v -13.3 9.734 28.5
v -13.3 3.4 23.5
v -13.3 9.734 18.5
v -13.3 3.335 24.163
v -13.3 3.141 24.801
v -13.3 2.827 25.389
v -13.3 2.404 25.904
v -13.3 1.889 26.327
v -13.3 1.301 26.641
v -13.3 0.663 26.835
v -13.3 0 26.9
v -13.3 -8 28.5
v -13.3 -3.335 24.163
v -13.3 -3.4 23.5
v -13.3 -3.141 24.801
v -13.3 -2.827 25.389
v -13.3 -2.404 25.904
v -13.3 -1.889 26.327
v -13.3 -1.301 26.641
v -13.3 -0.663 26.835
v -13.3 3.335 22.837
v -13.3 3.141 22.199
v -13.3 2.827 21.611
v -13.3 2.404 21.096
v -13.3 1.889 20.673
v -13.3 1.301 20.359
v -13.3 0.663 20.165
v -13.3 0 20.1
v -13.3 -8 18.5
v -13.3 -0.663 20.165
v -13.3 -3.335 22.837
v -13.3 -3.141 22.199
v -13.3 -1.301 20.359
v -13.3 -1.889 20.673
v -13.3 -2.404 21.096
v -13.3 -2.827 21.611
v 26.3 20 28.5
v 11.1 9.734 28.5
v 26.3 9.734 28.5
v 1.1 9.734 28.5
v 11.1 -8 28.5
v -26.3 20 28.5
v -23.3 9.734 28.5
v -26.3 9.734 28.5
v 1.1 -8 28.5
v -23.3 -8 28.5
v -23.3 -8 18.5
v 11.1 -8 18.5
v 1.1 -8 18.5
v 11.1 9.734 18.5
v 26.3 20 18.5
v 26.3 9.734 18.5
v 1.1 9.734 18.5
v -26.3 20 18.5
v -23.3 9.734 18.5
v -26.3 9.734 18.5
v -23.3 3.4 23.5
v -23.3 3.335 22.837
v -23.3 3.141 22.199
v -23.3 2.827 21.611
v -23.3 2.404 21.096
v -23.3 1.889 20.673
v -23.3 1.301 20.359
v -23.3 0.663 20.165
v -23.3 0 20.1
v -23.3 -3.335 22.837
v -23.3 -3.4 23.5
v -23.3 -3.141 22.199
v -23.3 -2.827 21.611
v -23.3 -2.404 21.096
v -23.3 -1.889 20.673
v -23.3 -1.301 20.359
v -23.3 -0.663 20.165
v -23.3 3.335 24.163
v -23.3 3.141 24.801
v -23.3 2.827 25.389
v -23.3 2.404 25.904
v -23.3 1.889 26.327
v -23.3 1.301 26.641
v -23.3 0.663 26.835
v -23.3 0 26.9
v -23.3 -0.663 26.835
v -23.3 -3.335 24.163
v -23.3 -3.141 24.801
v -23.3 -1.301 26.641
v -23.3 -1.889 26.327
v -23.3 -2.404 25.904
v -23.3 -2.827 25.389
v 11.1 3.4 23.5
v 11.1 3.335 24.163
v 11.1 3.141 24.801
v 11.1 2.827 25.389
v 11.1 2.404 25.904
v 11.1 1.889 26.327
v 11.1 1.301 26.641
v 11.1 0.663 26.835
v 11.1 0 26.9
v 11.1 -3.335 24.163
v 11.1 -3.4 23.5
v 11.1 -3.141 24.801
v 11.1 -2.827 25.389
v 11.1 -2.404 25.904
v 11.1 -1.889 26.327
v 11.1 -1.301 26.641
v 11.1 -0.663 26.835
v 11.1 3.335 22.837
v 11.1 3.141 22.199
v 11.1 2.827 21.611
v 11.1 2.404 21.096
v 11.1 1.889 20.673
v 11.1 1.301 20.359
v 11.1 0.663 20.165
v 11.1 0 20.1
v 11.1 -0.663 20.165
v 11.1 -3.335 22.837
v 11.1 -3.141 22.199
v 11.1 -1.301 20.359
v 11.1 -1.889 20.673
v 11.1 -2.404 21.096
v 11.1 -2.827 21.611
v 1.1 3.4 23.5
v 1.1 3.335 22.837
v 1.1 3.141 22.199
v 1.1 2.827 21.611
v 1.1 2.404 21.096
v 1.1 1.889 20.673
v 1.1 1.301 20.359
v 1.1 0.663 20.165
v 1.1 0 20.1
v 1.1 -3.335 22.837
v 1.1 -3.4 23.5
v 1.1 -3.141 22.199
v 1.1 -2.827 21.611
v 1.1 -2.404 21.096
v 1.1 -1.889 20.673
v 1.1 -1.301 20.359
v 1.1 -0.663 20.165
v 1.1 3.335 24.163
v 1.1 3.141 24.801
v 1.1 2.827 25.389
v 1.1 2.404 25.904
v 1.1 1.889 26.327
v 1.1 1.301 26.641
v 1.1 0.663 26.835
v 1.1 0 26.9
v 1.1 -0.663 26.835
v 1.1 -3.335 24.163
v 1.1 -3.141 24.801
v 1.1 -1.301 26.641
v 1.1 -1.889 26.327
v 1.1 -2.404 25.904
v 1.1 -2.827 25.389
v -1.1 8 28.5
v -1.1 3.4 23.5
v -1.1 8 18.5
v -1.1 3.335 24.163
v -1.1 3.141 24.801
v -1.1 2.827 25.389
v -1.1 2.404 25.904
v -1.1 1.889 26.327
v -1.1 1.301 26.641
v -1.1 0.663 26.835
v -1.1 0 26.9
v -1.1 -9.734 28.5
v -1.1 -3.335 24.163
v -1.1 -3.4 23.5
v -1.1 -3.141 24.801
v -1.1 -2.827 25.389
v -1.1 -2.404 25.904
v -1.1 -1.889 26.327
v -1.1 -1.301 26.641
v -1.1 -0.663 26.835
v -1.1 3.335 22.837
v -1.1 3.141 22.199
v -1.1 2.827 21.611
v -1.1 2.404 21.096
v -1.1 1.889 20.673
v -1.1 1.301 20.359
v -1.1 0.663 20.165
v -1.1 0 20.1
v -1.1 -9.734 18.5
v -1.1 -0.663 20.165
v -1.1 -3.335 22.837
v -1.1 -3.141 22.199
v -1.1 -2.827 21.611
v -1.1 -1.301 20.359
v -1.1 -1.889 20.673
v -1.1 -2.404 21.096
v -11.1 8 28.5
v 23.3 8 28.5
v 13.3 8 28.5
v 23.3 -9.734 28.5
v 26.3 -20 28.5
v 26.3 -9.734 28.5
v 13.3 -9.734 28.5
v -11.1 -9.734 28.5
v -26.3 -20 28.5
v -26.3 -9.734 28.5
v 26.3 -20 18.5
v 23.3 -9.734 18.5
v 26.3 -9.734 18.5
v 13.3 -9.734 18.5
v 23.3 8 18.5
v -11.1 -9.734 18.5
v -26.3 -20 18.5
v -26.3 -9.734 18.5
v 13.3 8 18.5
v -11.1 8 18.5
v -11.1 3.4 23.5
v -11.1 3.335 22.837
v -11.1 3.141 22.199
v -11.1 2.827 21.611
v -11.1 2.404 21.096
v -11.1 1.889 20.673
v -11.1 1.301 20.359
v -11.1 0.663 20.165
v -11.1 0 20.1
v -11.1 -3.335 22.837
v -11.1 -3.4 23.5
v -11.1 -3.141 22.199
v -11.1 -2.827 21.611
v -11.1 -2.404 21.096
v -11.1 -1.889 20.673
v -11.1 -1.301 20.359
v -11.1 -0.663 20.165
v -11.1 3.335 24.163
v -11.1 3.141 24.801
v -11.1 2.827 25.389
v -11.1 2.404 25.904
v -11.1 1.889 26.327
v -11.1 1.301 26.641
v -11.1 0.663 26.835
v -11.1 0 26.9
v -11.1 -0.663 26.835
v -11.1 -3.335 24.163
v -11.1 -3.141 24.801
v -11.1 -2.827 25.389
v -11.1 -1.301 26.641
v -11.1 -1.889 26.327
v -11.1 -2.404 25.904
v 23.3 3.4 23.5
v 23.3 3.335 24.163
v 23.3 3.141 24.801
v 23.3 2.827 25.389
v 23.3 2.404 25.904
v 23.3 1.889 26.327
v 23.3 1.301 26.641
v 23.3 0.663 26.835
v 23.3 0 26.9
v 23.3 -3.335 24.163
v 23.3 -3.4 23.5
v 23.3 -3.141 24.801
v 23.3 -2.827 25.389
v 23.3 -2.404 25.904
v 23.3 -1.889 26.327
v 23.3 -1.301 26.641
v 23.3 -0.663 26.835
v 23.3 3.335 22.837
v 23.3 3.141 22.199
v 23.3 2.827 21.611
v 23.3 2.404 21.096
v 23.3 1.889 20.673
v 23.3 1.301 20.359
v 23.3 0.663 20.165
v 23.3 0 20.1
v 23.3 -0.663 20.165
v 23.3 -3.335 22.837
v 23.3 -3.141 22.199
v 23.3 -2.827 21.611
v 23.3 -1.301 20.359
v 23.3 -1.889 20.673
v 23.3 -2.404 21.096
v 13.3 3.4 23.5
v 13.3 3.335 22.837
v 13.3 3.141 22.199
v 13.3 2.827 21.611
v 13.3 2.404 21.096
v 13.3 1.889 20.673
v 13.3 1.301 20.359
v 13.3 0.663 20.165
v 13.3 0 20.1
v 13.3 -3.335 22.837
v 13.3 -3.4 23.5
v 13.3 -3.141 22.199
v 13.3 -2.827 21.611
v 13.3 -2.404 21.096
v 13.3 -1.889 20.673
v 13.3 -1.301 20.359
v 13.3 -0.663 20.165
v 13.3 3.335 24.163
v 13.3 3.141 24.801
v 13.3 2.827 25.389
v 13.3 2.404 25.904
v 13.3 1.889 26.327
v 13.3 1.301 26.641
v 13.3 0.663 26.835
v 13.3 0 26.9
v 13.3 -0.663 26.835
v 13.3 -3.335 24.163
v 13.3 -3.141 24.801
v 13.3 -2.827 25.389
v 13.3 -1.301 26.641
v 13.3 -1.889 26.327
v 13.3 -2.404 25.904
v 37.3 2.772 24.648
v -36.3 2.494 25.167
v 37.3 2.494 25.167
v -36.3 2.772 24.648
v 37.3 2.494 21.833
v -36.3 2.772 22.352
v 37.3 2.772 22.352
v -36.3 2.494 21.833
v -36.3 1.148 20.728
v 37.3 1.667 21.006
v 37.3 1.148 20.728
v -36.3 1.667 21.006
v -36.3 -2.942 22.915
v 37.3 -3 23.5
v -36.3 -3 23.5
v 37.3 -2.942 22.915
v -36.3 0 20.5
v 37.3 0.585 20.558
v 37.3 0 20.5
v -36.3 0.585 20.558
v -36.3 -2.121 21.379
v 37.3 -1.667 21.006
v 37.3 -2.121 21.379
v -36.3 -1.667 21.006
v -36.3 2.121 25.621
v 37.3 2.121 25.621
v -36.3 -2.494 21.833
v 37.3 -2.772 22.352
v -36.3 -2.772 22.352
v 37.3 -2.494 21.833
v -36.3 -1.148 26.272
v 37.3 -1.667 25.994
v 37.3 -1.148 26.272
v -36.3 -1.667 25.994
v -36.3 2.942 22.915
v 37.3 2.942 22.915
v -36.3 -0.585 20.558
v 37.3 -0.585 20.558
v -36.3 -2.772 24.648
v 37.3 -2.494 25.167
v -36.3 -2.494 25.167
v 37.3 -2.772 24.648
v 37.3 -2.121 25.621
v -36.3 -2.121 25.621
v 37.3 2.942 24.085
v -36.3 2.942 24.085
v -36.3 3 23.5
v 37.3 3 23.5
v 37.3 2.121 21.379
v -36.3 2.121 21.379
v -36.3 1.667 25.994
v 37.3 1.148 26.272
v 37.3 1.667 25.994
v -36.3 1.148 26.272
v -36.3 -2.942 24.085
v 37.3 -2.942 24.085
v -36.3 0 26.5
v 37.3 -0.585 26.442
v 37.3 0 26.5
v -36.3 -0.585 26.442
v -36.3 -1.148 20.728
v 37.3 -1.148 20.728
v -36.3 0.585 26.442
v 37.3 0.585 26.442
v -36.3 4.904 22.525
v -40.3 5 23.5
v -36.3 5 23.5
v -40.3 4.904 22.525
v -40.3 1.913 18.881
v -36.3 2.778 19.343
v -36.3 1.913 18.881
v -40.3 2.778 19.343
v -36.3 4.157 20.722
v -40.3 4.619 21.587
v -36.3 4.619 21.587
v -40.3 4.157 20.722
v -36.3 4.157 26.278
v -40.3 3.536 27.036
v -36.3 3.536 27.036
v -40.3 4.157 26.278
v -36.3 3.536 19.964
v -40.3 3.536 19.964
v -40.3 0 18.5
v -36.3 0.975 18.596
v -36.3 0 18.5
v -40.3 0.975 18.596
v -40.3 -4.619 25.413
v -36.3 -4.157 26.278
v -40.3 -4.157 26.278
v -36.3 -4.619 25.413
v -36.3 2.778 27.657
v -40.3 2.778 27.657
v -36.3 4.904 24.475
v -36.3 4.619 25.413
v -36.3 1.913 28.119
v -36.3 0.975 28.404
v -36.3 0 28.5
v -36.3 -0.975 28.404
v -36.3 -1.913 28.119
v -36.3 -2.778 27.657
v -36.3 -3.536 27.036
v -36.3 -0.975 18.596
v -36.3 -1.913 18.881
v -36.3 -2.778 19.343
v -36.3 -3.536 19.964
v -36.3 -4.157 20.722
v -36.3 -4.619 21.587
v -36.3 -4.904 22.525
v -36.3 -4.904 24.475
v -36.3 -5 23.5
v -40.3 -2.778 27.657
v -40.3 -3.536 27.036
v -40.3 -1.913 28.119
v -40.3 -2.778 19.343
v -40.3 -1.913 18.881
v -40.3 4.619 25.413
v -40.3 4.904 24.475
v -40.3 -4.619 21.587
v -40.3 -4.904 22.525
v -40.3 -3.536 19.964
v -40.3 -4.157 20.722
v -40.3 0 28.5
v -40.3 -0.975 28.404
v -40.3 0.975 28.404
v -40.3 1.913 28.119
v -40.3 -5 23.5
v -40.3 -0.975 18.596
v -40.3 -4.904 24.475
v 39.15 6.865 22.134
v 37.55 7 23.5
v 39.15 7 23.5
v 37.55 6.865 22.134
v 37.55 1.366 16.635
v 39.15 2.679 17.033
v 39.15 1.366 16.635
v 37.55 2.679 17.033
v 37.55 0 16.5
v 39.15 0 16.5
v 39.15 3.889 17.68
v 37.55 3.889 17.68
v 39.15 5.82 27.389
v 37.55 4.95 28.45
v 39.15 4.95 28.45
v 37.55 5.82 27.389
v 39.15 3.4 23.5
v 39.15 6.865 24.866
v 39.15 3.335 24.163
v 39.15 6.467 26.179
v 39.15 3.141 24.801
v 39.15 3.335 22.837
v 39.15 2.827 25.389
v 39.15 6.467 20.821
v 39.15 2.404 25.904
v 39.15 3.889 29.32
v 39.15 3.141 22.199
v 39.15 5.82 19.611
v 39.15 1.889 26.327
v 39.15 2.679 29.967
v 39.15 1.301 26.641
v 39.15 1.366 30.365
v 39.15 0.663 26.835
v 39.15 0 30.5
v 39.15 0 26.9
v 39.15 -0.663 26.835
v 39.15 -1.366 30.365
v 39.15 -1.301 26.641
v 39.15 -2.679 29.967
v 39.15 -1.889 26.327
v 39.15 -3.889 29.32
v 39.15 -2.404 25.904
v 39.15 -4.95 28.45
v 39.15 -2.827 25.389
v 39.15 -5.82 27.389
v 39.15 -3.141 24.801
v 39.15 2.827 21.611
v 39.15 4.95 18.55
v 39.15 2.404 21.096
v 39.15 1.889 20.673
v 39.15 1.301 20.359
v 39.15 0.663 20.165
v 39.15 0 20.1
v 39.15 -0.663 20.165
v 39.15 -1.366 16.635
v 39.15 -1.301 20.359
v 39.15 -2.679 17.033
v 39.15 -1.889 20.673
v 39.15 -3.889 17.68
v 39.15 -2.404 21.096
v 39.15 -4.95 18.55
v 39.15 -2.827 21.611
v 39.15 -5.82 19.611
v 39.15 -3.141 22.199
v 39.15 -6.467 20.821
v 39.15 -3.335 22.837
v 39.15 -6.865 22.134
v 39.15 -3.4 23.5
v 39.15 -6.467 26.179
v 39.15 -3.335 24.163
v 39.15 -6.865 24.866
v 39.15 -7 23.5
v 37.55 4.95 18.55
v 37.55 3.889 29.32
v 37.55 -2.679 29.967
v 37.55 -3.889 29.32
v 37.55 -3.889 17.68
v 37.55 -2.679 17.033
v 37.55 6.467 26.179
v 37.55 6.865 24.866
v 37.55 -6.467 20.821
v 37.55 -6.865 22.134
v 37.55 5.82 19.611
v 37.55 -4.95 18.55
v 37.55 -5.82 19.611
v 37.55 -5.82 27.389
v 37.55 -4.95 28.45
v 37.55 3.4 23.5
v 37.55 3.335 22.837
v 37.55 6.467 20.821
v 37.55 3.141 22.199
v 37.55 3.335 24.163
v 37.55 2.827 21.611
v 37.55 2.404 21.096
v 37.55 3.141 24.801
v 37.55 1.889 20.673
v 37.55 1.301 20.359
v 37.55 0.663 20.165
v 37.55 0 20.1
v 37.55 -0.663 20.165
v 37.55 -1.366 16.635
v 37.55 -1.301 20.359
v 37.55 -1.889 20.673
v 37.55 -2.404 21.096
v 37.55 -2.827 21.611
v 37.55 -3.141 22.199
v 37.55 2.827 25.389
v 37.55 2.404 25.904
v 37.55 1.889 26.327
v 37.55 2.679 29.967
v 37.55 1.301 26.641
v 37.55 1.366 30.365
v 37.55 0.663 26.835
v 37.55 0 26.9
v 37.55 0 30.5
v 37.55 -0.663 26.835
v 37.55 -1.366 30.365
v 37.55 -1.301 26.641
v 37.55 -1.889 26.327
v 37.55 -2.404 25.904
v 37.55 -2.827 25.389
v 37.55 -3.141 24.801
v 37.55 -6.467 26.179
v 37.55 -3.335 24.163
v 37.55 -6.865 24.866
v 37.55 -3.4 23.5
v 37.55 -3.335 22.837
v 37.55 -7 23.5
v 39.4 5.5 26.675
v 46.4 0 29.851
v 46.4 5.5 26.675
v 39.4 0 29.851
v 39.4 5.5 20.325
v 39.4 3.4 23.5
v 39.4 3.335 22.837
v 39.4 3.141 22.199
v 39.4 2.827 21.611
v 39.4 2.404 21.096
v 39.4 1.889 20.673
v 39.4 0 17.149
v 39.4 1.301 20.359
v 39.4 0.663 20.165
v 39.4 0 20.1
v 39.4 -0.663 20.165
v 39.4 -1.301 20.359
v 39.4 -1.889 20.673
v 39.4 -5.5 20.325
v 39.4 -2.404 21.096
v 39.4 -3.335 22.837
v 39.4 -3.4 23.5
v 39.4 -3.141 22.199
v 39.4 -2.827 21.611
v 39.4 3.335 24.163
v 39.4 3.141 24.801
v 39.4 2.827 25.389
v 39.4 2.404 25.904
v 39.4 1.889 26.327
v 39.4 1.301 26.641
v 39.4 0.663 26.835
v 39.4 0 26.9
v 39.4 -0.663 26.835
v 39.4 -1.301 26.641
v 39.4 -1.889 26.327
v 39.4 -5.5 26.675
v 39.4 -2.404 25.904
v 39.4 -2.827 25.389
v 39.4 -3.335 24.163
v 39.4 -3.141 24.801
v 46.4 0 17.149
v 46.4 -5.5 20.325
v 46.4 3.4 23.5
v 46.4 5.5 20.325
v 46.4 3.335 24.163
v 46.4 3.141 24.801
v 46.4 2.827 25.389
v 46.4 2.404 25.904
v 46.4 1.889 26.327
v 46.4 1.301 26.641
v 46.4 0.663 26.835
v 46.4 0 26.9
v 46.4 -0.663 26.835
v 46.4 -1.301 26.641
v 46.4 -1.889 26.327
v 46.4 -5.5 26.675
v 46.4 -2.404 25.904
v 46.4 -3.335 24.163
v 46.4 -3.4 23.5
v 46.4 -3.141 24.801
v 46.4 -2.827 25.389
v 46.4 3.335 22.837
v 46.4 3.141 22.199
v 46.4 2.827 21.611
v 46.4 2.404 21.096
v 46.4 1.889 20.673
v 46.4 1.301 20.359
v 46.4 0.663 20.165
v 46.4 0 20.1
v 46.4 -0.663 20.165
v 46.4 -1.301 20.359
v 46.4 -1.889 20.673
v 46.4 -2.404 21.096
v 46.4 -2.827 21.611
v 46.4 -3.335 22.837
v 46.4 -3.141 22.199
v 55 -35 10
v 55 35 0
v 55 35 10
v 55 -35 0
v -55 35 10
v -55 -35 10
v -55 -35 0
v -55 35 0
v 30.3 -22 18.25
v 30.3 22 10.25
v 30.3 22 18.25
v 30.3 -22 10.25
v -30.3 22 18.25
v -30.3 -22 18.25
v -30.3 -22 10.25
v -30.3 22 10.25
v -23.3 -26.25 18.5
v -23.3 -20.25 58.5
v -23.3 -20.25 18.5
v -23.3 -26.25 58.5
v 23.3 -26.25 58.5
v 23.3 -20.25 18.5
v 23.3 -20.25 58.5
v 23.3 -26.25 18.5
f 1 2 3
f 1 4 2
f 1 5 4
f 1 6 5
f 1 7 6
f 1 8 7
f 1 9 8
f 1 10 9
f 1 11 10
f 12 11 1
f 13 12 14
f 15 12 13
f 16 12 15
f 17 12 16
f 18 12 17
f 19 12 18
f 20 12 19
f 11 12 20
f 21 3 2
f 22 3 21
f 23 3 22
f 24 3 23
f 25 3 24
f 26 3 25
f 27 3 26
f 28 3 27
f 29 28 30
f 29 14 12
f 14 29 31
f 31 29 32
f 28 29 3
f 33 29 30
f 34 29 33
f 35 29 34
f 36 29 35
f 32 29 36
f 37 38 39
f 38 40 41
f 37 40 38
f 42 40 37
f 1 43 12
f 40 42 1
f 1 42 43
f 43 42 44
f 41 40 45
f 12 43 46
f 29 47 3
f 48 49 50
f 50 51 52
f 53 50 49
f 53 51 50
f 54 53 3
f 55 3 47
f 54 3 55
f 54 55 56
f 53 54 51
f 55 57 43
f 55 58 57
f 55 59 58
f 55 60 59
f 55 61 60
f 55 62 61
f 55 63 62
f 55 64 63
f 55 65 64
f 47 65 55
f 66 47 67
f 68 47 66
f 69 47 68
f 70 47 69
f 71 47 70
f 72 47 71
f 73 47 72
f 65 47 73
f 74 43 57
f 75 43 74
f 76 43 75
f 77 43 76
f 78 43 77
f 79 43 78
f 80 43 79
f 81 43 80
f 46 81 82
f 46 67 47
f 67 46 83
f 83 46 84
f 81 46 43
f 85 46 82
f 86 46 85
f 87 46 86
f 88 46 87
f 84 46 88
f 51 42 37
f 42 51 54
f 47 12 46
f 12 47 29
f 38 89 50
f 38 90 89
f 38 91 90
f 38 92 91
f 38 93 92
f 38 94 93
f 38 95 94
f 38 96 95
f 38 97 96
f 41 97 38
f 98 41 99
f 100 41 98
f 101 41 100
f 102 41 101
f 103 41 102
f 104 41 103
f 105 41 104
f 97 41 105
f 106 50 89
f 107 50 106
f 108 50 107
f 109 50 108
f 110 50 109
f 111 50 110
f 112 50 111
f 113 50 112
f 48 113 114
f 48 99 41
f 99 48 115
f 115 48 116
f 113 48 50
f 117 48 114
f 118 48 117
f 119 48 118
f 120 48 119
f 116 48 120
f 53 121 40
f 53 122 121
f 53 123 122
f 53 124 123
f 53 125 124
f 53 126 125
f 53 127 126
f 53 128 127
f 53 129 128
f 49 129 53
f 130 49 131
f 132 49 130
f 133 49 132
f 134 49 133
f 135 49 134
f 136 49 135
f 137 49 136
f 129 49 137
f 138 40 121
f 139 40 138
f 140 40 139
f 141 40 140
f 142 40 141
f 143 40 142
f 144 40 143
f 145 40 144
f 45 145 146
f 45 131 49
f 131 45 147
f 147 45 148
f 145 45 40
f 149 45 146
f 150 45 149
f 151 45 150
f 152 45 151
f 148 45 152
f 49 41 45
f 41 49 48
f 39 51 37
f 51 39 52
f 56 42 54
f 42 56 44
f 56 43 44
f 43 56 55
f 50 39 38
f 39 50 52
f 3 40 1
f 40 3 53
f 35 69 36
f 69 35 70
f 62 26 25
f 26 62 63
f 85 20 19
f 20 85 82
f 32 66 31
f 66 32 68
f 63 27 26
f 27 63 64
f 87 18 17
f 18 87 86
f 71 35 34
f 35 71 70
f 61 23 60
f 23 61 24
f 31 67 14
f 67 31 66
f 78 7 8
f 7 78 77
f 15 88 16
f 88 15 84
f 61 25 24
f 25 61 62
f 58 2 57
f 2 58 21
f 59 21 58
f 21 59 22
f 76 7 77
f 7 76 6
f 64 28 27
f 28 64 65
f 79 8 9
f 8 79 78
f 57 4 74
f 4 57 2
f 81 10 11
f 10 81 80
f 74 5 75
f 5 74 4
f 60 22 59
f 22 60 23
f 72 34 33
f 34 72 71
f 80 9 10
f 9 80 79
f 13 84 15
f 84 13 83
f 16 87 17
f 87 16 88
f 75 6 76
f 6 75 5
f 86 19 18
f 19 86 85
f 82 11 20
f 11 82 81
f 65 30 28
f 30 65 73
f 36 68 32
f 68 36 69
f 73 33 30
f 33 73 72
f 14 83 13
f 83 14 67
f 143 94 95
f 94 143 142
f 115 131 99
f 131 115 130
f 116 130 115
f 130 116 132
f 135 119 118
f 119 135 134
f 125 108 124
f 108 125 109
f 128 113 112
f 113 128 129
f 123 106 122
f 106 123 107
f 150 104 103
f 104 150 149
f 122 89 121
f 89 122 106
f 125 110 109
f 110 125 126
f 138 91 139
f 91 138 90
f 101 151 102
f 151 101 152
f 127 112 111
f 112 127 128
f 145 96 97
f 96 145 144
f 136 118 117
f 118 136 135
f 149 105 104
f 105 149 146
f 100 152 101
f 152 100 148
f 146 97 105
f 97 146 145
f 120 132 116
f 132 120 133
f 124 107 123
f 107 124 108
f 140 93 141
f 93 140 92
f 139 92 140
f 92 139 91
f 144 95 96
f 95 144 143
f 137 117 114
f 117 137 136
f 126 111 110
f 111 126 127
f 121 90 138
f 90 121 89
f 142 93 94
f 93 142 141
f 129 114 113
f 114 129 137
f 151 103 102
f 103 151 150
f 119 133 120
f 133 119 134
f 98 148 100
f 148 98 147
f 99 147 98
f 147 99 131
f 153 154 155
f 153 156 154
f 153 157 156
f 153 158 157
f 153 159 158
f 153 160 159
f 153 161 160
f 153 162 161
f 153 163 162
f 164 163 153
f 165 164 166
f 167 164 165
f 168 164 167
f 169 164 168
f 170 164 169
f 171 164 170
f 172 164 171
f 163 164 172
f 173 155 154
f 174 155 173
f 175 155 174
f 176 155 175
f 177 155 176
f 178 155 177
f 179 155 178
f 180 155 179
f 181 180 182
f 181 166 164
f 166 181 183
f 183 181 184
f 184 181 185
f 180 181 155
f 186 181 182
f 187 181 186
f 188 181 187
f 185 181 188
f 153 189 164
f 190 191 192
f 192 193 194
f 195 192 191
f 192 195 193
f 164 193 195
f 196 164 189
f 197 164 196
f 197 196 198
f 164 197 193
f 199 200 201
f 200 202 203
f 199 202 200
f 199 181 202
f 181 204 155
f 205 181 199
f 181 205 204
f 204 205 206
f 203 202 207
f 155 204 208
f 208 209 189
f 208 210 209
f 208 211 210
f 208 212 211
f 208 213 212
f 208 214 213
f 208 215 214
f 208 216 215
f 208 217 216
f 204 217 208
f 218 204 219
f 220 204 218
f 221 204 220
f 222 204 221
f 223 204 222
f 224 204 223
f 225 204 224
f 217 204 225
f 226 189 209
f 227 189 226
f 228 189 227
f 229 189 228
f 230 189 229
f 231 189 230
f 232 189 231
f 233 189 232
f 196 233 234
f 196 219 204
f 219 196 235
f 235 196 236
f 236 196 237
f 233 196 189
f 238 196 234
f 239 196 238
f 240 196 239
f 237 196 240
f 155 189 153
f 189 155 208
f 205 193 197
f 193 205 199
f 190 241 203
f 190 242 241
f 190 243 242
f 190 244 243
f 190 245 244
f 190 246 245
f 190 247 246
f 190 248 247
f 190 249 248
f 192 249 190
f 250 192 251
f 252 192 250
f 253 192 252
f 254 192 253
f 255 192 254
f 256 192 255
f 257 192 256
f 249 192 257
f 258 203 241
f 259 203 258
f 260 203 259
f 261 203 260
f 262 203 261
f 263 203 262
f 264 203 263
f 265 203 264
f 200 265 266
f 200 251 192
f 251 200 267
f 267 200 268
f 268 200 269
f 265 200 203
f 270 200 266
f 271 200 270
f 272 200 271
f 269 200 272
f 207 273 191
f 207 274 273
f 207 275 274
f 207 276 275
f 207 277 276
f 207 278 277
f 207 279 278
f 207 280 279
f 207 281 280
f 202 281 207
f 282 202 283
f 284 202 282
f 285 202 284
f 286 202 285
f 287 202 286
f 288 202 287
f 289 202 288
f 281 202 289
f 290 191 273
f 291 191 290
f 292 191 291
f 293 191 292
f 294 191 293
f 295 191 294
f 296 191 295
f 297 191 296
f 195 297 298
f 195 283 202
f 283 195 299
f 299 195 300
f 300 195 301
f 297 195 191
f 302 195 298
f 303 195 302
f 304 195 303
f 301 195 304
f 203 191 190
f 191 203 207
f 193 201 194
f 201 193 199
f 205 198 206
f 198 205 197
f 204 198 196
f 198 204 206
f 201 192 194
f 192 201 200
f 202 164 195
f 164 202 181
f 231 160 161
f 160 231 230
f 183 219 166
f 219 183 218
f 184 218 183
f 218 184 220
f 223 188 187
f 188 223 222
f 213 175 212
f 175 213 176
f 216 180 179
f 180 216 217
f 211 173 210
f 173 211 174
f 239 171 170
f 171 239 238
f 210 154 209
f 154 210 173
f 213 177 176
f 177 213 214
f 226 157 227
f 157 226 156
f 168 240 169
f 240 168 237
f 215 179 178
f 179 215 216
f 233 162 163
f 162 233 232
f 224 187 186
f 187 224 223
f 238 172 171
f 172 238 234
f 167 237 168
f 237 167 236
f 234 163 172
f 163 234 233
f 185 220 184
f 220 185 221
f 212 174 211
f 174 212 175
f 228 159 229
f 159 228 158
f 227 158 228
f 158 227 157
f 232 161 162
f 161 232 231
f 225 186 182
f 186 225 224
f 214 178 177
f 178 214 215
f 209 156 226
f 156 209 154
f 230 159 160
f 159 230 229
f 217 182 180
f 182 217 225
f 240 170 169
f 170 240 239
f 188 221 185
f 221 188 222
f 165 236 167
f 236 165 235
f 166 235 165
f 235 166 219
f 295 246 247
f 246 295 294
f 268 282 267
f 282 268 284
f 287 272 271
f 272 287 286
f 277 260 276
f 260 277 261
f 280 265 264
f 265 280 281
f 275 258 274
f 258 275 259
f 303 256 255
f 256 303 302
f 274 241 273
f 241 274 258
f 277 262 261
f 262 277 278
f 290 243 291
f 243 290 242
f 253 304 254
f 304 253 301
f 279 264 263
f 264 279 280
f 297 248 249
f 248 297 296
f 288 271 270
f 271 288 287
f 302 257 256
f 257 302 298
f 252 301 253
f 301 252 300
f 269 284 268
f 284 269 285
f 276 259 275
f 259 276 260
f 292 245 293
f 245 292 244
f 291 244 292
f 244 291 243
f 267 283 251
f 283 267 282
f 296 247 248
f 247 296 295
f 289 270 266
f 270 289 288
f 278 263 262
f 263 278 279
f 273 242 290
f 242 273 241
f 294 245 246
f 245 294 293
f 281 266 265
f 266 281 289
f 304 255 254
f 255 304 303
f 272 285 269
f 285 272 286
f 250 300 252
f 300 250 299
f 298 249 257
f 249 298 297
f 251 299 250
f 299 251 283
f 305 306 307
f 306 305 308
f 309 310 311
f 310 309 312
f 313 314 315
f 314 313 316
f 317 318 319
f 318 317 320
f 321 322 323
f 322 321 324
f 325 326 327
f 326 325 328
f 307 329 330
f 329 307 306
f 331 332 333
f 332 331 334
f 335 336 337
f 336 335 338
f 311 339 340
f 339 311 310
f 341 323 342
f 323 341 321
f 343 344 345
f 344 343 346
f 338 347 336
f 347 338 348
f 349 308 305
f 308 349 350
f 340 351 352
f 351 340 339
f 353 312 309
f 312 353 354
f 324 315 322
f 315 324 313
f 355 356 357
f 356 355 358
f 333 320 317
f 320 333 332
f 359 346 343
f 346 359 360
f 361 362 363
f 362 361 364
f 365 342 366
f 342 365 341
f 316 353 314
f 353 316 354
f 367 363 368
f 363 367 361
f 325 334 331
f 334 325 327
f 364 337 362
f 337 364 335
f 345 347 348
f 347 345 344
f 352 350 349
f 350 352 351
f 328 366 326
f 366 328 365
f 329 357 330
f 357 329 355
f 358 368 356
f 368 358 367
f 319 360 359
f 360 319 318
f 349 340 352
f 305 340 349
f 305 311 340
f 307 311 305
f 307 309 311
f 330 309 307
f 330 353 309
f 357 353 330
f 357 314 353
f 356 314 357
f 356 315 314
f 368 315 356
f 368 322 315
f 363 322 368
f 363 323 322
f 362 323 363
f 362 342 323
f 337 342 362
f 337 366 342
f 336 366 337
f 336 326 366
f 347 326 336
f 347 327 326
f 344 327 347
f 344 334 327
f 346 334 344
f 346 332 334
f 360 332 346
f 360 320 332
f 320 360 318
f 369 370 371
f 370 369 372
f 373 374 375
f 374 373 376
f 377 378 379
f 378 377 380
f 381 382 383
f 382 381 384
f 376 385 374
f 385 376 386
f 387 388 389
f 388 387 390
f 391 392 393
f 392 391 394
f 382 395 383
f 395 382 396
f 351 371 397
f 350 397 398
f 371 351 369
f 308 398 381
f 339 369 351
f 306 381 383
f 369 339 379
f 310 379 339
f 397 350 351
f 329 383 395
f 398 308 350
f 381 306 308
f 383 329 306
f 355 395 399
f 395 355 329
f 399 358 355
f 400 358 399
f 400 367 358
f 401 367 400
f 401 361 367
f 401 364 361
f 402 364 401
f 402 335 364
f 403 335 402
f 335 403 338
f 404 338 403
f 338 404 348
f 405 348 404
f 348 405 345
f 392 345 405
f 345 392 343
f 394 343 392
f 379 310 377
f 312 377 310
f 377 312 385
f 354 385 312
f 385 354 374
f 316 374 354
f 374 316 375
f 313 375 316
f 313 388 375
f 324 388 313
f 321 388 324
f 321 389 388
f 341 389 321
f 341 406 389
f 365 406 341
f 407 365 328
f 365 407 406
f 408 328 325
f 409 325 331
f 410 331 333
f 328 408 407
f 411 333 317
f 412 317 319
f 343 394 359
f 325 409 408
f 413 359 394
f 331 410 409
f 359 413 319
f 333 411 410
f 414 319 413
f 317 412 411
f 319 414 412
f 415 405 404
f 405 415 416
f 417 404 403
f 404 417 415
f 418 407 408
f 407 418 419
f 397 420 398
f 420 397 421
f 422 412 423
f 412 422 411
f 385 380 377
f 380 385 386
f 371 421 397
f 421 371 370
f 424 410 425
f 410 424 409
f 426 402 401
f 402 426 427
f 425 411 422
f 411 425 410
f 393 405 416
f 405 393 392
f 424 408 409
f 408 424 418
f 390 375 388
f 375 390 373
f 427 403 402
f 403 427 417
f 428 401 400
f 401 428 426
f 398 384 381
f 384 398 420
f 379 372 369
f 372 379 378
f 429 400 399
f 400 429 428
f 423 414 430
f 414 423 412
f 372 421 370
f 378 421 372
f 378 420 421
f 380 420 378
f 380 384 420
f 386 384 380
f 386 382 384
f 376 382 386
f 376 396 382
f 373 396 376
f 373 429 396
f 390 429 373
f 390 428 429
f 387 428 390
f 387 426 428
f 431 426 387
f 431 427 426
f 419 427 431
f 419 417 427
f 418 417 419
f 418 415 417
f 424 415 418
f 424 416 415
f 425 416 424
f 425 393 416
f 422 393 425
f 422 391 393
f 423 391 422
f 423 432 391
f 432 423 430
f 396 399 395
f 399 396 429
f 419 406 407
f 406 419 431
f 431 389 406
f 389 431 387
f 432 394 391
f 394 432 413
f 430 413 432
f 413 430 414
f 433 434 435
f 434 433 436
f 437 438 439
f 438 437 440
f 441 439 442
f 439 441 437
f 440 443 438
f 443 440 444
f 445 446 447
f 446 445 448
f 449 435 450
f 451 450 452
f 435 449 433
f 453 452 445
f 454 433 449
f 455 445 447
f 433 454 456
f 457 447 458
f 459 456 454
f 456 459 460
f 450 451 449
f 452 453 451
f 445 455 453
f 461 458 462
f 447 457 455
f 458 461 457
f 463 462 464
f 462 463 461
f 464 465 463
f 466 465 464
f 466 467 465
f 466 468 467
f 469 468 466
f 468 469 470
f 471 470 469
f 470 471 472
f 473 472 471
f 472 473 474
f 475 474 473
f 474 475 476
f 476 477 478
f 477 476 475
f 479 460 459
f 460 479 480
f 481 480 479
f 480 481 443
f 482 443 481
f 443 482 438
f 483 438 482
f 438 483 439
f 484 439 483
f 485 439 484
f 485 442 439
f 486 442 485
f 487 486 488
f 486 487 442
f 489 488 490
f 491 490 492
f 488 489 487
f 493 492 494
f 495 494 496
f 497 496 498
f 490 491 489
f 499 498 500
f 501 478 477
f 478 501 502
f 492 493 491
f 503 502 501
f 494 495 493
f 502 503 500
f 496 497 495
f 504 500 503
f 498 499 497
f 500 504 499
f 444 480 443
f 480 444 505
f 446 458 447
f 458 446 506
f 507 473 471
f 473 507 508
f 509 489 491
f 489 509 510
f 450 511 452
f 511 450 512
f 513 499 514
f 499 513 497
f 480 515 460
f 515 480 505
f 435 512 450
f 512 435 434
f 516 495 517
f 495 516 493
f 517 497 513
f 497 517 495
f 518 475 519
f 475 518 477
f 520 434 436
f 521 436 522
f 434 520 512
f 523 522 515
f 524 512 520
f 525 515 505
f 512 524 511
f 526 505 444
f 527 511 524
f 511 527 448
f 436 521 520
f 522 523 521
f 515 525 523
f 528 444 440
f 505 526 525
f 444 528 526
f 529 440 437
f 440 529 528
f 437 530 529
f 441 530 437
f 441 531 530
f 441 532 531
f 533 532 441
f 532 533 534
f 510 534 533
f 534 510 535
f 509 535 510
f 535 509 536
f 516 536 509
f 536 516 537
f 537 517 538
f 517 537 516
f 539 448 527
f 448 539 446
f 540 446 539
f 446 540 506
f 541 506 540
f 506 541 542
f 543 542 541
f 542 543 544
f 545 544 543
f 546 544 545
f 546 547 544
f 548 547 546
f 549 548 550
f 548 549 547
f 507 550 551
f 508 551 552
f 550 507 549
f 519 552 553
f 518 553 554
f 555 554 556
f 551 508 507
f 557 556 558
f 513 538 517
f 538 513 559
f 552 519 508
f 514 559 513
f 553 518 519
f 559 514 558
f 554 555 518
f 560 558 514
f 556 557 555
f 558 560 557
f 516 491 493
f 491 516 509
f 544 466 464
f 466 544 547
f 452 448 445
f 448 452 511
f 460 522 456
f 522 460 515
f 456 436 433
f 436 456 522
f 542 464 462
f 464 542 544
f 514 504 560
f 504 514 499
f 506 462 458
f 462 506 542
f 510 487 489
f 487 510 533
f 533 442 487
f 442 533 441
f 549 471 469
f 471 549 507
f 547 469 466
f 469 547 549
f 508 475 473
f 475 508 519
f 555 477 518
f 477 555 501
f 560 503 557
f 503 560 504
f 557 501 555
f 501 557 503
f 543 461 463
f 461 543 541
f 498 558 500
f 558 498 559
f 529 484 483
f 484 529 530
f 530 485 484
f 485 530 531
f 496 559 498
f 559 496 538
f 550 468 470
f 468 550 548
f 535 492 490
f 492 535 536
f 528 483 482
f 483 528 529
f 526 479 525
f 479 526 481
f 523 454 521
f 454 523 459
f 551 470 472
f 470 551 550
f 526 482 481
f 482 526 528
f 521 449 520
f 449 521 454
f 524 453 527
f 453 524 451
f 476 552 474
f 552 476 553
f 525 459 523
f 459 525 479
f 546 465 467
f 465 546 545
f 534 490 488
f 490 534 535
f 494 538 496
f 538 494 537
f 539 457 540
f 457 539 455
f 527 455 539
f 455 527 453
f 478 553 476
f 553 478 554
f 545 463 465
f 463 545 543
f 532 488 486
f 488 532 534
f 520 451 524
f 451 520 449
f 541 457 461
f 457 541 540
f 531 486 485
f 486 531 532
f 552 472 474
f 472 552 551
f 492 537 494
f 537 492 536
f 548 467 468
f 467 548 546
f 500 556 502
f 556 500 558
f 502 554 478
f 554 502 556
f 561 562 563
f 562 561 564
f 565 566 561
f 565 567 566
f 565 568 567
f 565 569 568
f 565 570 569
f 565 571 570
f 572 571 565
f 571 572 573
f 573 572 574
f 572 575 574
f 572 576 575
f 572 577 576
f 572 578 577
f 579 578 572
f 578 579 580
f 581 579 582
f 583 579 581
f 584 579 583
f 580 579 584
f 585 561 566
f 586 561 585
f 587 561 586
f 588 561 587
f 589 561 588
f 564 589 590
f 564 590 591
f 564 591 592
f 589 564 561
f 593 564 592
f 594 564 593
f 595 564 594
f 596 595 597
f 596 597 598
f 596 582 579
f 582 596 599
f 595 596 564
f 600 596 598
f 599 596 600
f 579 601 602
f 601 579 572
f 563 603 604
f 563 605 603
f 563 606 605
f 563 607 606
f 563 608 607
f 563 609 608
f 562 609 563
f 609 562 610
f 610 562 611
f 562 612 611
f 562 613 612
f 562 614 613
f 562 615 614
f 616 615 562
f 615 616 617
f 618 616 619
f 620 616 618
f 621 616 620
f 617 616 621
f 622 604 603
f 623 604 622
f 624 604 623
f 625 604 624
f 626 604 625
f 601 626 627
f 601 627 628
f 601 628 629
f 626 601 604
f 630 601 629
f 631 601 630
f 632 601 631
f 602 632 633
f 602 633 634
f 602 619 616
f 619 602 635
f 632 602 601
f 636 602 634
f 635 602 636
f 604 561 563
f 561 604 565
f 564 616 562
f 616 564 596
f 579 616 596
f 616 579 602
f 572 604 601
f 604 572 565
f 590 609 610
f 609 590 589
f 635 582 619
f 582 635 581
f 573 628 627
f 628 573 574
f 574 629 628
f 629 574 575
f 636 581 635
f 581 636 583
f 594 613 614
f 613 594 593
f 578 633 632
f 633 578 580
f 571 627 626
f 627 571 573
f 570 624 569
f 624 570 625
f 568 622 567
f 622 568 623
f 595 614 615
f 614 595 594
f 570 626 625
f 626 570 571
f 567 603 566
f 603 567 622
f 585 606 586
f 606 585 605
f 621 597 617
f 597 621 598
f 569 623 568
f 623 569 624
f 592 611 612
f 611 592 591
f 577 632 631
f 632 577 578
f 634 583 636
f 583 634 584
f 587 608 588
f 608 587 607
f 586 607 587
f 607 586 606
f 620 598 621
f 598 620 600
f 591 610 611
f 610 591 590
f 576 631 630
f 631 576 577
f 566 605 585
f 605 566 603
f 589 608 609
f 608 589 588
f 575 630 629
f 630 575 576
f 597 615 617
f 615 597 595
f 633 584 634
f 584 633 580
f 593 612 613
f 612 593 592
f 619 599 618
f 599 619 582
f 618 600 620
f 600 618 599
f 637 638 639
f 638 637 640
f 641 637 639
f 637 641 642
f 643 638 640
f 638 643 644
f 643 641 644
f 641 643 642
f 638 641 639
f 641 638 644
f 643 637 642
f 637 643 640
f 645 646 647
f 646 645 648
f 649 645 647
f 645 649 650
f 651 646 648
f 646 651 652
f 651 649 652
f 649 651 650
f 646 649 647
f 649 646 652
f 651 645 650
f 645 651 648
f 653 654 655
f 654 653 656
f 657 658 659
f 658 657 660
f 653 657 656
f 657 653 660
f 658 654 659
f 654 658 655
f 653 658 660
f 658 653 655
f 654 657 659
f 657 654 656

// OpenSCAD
$fn = 32;

// ------------------------------------------------------------------------
// Comb hinge with flap: leaf 52.6 x 20 mm, pin d6, flap 40 mm
// Every part is its own module, assembly() places every instance.
// ------------------------------------------------------------------------

// --- part 1 ---
module hinge_bed() {
  difference() {
    translate([-55, -35, 0]) cube([110, 70, 10]);
  }
}

// --- part 2 ---
module hinge_riser() {
  difference() {
    translate([-30.3, -22, 0]) cube([60.6, 44, 8]);
  }
}

// --- part 3 ---
module hinge_leaf_a() {
  difference() {
    union() {
      translate([-23.3, -8, -5]) cube([10, 28, 10]);
      translate([1.1, -8, -5]) cube([10, 28, 10]);
      translate([-26.3, 9.734, -5]) cube([52.6, 10.266, 10]);
    }
    translate([-18.3, 0, 0]) rotate([0, 90, 0]) cylinder(h = 12, d = 6.8, center = true);
    translate([6.1, 0, 0]) rotate([0, 90, 0]) cylinder(h = 12, d = 6.8, center = true);
  }
}

// --- part 4 ---
module hinge_leaf_b() {
  difference() {
    union() {
      translate([-11.1, -20, -5]) cube([10, 28, 10]);
      translate([13.3, -20, -5]) cube([10, 28, 10]);
      translate([-26.3, -20, -5]) cube([52.6, 10.266, 10]);
    }
    translate([-6.1, 0, 0]) rotate([0, 90, 0]) cylinder(h = 12, d = 6.8, center = true);
    translate([18.3, 0, 0]) rotate([0, 90, 0]) cylinder(h = 12, d = 6.8, center = true);
  }
}

// --- part 5 ---
module hinge_flap() {
  difference() {
    translate([-23.3, -20, 0]) cube([46.6, 40, 6]);
  }
}

// --- part 6 ---
module hinge_pin() {
  rotate([0, 90, 0]) cylinder(h = 74.6, d = 6, center = true);
  translate([-40.3, 0, 0]) rotate([0, 90, 0]) cylinder(h = 4, d = 10);
}

// --- part 7 ---
module pin_washer() {
  difference() {
      translate([0, 0, 0]) cylinder(h = 1.6, d = 14);
      translate([0, 0, -1]) cylinder(h = 3.6, d = 6.8);
    }
}

// --- part 8 ---
module pin_nut() {
  difference() {
    linear_extrude(height = 7) polygon(points = [[6.351, 0], [3.175, 5.5], [-3.175, 5.5], [-6.351, 0], [-3.175, -5.5], [3.175, -5.5]]);
    translate([0, 0, -1]) cylinder(h = 9, d = 6.8);
  }
}

// --- assembly ---
module assembly() {
  color([0.80, 0.24, 0.20]) translate([0, 0, 0]) rotate([0, 0, 0]) hinge_bed();
  color([0.20, 0.45, 0.75]) translate([0, 0, 10.25]) rotate([0, 0, 0]) hinge_riser();
  color([0.25, 0.62, 0.32]) translate([0, 0, 23.5]) rotate([0, 0, 0]) hinge_leaf_a();
  color([0.92, 0.70, 0.18]) translate([0, 0, 23.5]) rotate([0, 0, 0]) hinge_leaf_b();
  color([0.58, 0.35, 0.70]) translate([0, -20.25, 38.5]) rotate([90, 0, 0]) hinge_flap();
  color([0.16, 0.66, 0.66]) translate([0, 0, 23.5]) rotate([0, 0, 0]) hinge_pin();
  color([0.85, 0.48, 0.18]) translate([37.55, 0, 23.5]) rotate([0, 90, 0]) pin_washer();
  color([0.55, 0.60, 0.65]) translate([39.4, 0, 23.5]) rotate([0, 90, 0]) pin_nut();
}

assembly();
